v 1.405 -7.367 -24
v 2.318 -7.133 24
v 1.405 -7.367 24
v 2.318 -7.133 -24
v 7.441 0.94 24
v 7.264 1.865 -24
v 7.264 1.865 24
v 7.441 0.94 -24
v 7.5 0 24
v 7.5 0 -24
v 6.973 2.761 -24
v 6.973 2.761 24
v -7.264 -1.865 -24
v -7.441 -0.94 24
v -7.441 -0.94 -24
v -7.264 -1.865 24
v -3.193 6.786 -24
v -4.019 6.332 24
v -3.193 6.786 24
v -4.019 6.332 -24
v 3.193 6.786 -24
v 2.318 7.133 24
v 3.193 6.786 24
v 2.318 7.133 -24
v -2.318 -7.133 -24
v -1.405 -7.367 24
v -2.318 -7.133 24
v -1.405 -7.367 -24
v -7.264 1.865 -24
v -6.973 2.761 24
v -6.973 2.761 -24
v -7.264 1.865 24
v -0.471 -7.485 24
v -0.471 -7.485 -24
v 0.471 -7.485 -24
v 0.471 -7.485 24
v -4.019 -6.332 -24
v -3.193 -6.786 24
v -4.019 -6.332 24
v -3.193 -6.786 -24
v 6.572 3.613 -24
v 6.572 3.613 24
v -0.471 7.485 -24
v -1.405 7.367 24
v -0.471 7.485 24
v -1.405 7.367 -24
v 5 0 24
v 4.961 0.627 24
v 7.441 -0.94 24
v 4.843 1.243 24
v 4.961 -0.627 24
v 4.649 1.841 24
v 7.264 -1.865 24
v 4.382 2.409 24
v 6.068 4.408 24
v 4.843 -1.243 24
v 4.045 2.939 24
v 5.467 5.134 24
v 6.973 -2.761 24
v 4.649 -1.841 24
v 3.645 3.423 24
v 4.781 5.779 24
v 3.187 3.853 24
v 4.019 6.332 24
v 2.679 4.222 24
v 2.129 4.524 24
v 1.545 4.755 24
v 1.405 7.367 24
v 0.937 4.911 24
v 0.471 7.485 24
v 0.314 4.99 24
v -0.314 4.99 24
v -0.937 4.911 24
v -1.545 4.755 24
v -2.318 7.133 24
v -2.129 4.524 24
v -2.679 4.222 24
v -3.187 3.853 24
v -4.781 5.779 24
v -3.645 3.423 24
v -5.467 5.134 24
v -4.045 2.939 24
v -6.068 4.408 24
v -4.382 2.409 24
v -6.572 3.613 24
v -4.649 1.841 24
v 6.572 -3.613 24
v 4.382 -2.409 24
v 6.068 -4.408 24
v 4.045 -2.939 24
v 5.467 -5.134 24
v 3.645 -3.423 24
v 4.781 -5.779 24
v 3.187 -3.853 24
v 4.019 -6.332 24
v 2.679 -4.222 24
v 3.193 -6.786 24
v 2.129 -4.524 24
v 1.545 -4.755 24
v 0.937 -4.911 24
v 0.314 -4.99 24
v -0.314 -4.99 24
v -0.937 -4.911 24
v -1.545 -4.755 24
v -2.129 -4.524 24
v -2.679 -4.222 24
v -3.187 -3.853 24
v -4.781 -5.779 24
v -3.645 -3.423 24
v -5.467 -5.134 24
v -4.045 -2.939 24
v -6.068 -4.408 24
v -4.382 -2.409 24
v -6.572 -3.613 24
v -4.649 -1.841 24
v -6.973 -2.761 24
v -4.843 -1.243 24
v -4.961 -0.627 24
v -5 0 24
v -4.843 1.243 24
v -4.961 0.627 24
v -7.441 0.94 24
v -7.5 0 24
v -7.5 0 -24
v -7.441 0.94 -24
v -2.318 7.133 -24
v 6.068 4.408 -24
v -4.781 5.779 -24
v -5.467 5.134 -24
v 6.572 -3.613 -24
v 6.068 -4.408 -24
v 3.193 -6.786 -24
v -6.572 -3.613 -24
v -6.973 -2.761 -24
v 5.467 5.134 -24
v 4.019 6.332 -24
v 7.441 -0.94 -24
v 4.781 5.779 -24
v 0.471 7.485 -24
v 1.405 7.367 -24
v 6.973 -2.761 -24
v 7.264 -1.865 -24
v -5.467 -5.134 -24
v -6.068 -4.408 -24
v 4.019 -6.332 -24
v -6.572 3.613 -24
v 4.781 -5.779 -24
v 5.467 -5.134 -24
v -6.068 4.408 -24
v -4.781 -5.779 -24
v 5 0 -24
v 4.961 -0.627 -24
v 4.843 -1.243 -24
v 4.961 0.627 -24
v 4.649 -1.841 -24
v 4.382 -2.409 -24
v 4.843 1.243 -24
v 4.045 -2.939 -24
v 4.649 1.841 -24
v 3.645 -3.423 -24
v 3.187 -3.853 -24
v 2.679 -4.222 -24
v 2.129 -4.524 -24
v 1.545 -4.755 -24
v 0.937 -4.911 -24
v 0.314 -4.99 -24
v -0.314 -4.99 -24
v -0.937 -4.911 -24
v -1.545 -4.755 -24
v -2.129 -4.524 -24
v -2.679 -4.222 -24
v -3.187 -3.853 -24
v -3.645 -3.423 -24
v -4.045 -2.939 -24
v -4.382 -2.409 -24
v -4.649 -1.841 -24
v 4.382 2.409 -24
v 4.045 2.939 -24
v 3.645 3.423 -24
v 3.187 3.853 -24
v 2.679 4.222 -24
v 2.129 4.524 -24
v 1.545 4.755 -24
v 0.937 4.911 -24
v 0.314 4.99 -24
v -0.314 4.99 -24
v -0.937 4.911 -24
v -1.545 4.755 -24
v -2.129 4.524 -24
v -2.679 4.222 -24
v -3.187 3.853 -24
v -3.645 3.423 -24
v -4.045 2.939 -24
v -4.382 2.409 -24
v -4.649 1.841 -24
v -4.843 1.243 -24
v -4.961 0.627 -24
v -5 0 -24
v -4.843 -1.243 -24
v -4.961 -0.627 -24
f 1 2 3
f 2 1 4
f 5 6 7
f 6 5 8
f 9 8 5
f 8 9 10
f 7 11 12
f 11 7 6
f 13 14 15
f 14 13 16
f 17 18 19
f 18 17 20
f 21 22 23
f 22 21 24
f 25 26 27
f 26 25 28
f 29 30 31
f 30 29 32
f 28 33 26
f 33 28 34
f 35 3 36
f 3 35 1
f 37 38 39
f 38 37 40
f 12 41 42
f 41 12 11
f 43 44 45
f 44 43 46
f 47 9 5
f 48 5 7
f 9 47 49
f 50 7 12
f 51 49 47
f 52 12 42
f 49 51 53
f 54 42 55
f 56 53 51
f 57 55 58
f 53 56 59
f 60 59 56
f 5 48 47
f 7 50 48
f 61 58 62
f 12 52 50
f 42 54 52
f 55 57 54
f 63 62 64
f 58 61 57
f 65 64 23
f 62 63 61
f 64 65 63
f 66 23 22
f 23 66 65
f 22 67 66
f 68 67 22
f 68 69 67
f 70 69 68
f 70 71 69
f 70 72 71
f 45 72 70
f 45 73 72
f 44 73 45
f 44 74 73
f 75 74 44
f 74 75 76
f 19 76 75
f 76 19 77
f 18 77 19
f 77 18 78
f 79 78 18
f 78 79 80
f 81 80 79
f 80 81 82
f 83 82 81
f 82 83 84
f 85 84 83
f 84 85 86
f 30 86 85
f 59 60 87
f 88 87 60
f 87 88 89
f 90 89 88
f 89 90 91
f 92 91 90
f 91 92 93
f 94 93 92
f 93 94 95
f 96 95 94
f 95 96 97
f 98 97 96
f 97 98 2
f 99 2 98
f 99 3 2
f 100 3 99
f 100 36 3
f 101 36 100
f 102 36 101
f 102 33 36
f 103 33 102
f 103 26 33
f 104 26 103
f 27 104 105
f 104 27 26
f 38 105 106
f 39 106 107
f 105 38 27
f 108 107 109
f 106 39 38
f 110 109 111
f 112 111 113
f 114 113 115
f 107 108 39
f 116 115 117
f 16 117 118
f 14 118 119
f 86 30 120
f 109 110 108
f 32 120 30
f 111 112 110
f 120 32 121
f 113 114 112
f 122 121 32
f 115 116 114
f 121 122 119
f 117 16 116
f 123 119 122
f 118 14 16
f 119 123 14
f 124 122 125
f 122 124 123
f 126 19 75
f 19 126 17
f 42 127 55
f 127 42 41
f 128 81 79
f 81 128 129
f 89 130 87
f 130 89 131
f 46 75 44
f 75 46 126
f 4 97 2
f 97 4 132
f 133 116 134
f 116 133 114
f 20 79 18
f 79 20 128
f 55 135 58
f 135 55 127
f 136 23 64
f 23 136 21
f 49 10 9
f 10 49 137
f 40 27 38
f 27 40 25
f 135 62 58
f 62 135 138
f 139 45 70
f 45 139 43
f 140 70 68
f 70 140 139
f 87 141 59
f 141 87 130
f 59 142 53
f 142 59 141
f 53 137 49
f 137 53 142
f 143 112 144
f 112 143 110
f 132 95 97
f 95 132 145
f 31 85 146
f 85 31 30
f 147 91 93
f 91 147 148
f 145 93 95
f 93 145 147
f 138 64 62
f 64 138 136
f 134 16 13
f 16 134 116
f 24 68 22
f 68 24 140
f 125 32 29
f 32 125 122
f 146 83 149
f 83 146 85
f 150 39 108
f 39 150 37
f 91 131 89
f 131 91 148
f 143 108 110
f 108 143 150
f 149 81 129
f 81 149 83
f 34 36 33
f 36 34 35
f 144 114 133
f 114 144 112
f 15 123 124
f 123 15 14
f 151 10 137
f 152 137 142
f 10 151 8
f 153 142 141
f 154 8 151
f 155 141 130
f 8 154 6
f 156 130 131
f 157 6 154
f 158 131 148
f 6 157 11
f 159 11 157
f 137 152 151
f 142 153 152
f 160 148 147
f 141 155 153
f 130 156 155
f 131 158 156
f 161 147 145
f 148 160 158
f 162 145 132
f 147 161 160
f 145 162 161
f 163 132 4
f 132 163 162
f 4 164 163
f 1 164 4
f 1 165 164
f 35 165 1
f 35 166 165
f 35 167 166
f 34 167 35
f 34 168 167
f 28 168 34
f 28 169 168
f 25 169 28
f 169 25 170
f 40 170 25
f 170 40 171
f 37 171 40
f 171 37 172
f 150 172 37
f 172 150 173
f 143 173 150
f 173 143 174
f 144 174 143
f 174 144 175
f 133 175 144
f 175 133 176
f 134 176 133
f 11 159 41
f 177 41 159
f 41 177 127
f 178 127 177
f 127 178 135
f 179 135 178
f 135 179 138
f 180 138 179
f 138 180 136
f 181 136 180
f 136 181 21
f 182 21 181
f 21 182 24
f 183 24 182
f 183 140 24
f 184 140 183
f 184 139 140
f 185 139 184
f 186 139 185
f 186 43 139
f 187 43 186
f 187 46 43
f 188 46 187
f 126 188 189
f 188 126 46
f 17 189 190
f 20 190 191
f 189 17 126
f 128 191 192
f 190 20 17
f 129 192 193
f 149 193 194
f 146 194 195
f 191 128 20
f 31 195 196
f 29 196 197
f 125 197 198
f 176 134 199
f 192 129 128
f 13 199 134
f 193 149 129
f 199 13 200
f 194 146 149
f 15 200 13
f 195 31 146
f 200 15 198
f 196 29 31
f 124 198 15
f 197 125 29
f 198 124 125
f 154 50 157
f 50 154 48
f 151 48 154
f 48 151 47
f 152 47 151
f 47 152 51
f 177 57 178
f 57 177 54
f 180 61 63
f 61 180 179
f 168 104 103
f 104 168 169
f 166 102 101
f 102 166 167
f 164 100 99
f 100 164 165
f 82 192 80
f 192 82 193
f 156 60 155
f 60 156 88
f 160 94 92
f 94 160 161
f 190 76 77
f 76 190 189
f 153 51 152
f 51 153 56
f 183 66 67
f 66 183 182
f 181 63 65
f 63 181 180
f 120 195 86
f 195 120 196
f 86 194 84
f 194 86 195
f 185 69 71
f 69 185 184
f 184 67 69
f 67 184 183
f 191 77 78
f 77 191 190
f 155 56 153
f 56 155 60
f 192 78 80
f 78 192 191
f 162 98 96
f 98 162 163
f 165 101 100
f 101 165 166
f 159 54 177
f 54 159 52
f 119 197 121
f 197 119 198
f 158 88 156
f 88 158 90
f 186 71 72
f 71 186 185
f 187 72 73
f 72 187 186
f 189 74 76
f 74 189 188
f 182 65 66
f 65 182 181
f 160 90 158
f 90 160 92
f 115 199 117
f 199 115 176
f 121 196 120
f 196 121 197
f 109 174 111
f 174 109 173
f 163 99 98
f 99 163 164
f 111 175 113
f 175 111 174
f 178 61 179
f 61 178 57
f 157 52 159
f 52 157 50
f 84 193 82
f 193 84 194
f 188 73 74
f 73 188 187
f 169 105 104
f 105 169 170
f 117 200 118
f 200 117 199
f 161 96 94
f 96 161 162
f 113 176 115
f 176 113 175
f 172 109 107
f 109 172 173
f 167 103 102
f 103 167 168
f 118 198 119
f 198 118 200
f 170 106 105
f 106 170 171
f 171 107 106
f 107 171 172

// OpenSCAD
$fn = 50;


difference() {
	union() {
		translate(v = [0, 0, -24.0000000000]) {
			cylinder(h = 48, r = 7.5000000000);
		}
	}
	union() {
		translate(v = [0, 0, -100.0000000000]) {
			cylinder(h = 200, r = 5.0000000000);
		}
	}
}
